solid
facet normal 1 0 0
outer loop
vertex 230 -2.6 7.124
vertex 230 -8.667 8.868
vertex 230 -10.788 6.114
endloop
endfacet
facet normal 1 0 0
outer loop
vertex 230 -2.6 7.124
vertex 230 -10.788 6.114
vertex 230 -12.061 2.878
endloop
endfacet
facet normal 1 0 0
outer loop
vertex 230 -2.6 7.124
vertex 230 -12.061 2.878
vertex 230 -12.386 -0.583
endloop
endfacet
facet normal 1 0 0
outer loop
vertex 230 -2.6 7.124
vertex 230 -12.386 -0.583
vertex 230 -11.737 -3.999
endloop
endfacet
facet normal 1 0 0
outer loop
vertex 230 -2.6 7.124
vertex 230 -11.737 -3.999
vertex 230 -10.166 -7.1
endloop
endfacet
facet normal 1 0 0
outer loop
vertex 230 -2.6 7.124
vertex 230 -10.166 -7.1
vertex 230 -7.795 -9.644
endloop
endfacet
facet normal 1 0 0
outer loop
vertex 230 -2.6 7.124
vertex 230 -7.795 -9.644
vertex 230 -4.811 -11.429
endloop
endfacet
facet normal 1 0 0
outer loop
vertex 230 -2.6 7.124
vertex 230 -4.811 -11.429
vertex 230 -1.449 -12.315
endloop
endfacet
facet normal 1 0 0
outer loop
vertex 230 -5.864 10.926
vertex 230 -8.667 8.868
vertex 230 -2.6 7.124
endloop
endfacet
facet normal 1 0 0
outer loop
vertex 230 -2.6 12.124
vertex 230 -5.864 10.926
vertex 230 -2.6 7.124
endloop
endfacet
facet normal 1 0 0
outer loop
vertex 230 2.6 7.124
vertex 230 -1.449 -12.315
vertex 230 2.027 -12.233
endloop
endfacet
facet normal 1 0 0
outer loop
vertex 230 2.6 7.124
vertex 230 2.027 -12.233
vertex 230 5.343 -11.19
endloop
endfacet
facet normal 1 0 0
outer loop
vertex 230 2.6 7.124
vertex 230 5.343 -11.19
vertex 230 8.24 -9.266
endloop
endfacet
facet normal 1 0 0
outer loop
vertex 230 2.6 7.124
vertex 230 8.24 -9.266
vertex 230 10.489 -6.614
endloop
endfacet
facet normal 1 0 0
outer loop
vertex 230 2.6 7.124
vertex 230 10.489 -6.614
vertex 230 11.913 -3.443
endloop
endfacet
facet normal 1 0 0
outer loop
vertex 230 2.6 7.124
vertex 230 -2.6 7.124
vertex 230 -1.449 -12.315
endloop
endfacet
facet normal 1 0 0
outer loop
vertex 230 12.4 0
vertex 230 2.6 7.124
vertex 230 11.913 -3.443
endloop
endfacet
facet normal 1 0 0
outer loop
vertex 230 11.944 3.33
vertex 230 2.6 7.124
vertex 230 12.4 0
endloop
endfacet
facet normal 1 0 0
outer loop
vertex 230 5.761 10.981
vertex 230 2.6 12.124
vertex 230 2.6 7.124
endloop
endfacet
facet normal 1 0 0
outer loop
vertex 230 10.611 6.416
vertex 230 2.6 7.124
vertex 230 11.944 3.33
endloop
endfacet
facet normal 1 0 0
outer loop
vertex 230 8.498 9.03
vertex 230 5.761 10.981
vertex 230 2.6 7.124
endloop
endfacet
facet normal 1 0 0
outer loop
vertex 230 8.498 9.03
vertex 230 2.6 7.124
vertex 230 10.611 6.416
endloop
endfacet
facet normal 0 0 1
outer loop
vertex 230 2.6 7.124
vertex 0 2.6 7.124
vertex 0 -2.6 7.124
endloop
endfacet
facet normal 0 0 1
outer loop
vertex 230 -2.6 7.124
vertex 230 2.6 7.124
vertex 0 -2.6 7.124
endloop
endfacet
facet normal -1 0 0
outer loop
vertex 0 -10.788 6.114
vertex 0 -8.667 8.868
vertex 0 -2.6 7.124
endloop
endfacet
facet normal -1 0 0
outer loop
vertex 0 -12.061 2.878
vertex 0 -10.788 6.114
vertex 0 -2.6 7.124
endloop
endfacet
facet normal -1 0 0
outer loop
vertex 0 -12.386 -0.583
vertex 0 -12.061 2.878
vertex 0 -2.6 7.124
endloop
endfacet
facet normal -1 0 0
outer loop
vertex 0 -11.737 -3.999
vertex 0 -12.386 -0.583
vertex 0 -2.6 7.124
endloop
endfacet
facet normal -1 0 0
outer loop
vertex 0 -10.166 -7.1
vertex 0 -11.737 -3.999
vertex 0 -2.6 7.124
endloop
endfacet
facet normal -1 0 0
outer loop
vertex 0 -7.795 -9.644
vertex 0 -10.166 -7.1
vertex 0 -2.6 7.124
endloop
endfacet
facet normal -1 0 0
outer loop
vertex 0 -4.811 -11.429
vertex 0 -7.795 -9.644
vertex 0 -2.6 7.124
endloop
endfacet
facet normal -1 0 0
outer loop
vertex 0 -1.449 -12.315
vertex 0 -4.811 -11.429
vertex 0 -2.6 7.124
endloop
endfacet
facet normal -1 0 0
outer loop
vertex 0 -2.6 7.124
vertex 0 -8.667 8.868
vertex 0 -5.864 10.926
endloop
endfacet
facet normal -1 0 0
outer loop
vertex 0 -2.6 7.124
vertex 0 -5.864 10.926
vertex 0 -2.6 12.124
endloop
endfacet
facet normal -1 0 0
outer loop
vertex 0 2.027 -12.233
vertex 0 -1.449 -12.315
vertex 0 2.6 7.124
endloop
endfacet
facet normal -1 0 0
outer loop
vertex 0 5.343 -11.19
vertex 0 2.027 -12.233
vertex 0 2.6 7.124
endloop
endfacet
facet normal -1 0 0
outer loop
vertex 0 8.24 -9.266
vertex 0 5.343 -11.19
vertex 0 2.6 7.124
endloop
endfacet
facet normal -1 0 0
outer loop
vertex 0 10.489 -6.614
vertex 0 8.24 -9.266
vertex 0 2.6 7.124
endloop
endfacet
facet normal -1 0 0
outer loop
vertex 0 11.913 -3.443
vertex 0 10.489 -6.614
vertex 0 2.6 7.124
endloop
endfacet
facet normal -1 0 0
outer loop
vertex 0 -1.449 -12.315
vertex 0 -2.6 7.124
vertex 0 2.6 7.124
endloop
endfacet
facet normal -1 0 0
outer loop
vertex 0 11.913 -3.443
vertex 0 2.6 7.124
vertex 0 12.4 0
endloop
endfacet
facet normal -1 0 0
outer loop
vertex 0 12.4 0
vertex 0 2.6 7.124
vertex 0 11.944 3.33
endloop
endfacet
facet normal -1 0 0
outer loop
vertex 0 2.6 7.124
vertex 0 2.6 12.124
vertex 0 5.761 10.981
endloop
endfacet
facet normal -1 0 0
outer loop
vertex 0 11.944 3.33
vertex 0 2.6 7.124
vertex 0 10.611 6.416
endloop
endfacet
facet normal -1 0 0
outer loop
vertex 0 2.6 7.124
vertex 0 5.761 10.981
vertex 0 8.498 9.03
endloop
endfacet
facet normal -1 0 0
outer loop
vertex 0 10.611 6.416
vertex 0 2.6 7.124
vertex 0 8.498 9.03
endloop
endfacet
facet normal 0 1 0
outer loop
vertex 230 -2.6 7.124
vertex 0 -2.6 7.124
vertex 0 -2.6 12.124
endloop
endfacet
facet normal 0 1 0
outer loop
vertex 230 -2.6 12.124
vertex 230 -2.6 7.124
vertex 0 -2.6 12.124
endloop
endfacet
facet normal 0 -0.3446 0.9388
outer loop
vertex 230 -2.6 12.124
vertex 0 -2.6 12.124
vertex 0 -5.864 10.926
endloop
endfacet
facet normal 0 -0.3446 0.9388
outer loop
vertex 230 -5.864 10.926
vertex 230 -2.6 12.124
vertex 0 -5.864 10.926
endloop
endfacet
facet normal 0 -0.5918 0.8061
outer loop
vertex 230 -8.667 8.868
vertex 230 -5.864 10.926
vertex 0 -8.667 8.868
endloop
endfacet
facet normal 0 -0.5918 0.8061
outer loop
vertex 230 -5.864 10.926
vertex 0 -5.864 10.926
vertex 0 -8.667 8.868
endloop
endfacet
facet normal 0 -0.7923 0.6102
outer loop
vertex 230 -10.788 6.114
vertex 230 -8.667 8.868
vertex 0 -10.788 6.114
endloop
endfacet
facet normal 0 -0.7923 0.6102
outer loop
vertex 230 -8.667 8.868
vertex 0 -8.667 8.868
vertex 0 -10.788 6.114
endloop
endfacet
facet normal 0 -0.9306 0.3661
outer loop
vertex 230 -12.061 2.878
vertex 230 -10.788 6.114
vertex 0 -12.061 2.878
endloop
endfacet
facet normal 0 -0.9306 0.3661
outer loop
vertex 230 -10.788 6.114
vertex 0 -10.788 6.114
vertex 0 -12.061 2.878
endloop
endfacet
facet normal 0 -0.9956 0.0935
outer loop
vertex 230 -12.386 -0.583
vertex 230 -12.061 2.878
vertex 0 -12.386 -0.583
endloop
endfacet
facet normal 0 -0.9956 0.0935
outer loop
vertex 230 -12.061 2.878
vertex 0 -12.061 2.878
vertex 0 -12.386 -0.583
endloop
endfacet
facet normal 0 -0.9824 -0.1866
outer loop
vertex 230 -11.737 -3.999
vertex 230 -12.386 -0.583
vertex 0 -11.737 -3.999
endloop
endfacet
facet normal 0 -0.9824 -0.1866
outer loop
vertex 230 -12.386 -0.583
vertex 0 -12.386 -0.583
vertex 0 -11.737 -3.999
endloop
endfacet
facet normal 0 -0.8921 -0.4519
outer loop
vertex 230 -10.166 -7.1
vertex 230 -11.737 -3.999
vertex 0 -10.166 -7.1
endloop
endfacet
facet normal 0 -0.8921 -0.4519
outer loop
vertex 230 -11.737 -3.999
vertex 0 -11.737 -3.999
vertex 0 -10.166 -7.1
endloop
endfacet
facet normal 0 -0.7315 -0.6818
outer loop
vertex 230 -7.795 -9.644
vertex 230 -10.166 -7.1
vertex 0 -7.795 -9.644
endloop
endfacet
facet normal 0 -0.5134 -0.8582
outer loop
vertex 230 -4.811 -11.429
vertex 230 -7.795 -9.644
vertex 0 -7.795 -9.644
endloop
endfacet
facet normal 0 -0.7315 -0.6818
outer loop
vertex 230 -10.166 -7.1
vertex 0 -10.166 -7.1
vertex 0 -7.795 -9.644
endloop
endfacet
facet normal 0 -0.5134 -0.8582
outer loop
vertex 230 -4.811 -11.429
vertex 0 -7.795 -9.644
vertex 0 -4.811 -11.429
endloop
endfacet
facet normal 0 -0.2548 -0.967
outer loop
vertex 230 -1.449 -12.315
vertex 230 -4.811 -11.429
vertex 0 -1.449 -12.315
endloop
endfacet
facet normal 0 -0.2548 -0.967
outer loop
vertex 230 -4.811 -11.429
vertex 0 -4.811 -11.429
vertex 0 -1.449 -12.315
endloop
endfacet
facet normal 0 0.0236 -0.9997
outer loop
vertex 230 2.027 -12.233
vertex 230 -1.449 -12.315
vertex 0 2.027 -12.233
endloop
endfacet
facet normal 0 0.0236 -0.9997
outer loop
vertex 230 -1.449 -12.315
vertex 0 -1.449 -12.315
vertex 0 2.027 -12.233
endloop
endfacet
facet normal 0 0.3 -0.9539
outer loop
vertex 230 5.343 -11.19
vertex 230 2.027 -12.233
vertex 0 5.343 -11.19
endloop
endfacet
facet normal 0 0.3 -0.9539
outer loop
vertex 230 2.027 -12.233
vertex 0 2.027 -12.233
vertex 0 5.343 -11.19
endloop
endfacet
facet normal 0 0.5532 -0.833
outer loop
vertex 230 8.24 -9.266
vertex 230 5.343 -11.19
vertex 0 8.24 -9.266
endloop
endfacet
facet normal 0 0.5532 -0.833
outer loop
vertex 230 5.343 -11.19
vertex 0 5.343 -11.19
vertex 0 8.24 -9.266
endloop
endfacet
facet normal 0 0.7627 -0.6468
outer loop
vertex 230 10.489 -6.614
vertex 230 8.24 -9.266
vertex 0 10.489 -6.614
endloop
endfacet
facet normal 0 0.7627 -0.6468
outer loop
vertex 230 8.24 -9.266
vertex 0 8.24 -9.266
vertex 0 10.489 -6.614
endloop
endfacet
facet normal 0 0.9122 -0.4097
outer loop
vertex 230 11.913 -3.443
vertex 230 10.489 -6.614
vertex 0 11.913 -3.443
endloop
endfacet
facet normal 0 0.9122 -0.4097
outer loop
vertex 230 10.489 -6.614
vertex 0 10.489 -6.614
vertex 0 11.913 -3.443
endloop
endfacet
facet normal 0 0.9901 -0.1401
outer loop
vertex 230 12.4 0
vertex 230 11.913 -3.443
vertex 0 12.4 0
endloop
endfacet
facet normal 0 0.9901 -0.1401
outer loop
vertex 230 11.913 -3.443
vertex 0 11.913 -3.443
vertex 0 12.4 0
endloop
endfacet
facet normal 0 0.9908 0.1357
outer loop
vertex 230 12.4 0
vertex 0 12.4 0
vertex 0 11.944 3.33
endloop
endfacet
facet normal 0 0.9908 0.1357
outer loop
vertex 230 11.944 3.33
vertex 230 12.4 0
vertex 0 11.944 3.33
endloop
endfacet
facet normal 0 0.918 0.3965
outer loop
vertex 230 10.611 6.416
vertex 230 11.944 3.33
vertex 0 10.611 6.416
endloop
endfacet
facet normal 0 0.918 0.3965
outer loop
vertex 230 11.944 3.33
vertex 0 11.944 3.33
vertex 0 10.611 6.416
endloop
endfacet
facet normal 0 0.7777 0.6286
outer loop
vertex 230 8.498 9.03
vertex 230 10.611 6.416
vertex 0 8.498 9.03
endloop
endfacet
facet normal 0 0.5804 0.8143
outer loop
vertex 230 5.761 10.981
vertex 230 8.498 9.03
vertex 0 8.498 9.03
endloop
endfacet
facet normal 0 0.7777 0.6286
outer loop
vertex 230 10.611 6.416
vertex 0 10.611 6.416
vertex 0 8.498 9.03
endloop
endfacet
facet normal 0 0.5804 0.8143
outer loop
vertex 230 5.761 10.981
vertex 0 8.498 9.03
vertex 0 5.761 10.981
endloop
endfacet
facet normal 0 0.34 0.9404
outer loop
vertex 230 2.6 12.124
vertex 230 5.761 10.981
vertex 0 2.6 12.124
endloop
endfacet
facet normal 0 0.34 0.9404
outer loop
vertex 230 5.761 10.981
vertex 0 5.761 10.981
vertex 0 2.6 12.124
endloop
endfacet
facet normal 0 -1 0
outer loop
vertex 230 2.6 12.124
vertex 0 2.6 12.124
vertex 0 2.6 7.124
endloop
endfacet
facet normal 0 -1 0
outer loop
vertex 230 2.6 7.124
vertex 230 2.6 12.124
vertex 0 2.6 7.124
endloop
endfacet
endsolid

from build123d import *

# Parameters (mm, degrees)
BOSS_EXTRUDE2_DEPTH = 230


with BuildPart() as part:
    # Sketch1 → Boss-Extrude2 (new body)
    with BuildSketch(Plane.YZ):
        with BuildLine():
            Line((2.6, 7.124355653), (-2.6, 7.124355653))
            Line((-2.6, 7.124355653), (-2.6, 12.124355653))
            ThreePointArc((-2.6, 12.124355653), (-7.794870108, -9.643650761), (12.4, 0))
            ThreePointArc((12.4, 0), (9.643650761, 7.794870108), (2.6, 12.124355653))
            Line((2.6, 12.124355653), (2.6, 7.124355653))
        make_face()
    extrude(amount=BOSS_EXTRUDE2_DEPTH)


solid = part.part
